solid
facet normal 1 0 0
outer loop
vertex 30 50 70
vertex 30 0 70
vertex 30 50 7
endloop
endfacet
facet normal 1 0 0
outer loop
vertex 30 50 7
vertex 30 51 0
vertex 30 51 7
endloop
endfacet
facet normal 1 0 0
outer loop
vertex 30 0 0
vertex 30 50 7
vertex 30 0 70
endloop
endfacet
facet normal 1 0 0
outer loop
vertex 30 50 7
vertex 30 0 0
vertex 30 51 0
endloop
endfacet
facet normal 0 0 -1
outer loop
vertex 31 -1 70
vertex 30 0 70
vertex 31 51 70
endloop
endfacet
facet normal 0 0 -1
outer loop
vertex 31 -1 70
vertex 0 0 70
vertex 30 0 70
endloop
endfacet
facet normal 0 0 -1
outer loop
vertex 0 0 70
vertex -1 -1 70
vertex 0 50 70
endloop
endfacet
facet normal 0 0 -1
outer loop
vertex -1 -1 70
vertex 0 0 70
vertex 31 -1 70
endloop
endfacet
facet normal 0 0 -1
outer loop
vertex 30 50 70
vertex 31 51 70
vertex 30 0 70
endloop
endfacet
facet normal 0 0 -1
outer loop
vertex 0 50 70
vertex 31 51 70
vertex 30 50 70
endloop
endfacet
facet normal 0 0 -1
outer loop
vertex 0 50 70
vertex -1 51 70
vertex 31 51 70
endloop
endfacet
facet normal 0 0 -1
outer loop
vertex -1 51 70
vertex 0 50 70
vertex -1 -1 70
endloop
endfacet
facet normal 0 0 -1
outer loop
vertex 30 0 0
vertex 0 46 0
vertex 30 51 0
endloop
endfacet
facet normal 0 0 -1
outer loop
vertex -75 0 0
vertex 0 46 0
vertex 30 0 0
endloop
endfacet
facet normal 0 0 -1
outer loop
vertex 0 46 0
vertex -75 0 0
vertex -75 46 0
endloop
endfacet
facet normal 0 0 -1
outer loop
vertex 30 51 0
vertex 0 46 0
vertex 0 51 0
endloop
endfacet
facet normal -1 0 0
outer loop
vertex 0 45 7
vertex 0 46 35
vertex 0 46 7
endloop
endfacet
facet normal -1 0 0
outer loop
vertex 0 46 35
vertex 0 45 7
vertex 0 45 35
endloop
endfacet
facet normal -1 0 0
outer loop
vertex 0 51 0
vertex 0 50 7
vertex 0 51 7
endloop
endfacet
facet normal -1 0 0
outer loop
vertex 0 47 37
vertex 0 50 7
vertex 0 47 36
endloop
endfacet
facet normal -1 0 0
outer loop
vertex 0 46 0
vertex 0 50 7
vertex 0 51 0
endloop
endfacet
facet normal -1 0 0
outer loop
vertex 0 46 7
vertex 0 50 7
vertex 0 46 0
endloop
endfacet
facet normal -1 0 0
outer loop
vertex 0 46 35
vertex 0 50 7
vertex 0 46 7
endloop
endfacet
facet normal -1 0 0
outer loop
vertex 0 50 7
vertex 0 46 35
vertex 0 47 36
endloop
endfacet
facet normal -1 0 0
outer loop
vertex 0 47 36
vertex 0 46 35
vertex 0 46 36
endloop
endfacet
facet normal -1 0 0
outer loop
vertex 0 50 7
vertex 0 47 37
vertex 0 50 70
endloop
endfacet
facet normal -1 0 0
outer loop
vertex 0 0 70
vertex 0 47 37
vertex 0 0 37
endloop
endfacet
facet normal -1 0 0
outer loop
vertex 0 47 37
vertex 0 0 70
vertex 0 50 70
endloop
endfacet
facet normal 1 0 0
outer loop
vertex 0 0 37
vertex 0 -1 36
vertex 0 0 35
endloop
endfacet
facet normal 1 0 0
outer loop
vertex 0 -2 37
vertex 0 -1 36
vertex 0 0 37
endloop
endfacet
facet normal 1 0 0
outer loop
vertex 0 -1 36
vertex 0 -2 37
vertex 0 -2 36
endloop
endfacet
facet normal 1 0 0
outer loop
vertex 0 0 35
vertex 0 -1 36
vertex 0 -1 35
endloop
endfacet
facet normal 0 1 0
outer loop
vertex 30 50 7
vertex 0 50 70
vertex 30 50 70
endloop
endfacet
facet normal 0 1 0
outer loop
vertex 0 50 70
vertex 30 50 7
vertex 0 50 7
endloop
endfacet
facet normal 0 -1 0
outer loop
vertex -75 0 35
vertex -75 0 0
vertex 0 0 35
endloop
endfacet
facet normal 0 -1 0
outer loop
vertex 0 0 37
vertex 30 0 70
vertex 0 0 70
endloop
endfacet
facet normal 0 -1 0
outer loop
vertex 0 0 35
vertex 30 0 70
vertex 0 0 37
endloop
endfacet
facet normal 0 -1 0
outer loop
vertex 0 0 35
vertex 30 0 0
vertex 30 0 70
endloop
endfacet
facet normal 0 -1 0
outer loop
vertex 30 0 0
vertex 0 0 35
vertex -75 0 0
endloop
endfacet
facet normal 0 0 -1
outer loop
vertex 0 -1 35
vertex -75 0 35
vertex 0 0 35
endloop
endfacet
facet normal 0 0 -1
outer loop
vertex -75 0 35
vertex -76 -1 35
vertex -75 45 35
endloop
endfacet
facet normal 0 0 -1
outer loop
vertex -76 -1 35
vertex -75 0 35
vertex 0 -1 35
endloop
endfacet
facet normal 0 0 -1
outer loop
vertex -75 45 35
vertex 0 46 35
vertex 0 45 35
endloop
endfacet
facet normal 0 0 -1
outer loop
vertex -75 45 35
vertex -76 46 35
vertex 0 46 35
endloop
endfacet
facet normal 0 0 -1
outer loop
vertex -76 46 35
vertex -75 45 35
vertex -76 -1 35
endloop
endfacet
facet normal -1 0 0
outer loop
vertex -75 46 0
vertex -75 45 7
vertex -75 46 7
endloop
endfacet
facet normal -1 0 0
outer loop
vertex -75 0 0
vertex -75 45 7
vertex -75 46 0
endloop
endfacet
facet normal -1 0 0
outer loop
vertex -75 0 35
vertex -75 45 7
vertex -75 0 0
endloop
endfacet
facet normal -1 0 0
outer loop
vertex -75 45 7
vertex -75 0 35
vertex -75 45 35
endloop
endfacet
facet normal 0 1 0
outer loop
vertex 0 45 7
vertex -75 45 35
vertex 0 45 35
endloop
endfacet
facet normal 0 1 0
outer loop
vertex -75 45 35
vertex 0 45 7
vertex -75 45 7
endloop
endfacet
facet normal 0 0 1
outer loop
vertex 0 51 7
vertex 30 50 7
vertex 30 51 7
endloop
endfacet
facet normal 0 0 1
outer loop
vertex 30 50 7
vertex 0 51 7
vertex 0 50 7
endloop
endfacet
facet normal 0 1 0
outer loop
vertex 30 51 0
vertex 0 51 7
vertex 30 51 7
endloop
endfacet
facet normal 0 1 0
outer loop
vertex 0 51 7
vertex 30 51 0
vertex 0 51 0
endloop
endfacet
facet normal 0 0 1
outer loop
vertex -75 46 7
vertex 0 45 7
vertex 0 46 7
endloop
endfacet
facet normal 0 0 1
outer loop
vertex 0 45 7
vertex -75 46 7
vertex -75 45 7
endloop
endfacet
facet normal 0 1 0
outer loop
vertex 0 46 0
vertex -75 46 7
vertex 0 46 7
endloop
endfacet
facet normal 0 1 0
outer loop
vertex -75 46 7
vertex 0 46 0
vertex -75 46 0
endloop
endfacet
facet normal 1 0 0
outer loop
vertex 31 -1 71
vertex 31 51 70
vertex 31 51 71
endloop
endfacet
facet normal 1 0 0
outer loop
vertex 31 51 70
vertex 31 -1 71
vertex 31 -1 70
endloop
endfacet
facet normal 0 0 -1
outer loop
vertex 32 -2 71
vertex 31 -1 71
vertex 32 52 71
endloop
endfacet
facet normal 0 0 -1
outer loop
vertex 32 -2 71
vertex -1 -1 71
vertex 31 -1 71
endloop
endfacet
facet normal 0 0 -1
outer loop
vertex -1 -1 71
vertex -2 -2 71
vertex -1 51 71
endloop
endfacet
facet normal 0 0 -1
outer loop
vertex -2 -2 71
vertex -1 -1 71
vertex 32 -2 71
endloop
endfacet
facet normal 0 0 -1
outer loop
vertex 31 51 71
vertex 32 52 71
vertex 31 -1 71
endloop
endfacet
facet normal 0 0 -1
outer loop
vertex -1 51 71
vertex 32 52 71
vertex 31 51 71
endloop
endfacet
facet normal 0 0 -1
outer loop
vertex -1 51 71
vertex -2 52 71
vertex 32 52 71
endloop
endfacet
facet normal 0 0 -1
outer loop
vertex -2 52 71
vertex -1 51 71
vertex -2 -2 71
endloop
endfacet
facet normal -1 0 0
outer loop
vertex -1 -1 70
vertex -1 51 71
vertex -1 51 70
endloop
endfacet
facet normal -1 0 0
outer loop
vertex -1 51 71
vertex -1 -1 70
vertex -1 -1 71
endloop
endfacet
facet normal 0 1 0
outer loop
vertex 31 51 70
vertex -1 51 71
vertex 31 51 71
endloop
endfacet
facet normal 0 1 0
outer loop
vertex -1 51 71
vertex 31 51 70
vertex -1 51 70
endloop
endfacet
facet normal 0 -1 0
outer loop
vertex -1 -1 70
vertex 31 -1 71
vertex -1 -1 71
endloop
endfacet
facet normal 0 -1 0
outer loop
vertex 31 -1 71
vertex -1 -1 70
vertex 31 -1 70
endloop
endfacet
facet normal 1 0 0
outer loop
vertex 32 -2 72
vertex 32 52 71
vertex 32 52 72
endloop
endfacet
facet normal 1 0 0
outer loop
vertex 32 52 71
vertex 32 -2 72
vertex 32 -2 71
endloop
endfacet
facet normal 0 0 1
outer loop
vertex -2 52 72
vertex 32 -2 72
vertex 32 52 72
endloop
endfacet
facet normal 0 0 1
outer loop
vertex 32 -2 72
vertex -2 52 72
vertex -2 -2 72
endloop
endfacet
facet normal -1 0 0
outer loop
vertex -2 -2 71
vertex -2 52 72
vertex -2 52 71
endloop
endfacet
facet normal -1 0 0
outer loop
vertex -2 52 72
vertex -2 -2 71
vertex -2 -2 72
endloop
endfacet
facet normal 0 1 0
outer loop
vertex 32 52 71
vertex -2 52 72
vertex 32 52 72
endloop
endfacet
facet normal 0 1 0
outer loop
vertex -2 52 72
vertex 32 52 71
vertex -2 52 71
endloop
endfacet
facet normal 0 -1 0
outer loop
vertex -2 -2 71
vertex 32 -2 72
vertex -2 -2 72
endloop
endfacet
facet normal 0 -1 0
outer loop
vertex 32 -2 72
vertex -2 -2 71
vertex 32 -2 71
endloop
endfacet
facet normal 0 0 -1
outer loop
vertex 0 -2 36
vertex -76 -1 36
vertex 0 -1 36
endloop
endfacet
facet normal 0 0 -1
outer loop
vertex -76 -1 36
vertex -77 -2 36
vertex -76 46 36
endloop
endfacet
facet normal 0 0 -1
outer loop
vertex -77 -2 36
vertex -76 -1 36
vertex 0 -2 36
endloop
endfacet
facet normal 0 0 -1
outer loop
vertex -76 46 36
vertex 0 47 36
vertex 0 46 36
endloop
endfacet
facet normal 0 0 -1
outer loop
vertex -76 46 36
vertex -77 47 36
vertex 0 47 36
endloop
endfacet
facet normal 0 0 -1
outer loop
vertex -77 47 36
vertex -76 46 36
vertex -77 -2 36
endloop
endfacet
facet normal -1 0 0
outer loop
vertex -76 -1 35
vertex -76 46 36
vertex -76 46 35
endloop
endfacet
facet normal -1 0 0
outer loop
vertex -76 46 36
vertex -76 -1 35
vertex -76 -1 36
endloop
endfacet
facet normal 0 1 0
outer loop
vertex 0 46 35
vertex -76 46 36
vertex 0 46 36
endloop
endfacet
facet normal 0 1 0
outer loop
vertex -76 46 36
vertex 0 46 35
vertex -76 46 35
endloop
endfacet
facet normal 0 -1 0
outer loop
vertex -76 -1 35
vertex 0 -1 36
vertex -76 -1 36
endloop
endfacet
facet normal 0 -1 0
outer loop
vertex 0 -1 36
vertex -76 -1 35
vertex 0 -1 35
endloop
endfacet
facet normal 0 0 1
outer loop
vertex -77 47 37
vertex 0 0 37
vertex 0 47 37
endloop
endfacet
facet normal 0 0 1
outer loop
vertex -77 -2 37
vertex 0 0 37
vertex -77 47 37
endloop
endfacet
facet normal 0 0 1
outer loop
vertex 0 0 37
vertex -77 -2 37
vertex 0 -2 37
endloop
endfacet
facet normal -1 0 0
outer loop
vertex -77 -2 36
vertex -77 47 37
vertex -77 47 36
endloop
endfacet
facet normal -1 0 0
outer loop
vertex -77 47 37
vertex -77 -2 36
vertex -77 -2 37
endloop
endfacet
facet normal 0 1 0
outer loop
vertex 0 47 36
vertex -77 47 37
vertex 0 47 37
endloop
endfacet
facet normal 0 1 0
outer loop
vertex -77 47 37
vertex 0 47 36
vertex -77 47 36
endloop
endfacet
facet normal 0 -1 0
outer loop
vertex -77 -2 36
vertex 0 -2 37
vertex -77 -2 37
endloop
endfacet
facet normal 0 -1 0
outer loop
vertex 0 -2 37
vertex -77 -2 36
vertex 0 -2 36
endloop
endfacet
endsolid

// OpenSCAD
cube([30,50,70]);
translate([-75,0,0]) {
    cube([75,45,35]);
}  

translate([0,50,0]) cube([30,1,7]);
translate([-75,45,0]) cube([75,1,7]);

translate([-1,-1,70]) cube([32,52,1]);
translate([-2,-2,71]) cube([34,54,1]);

translate([-76,-1,35]) cube([76,47,1]);
translate([-77,-2,36]) cube([77,49,1]);

polyhedron(
points=[ [0,47,37],[0,-2,37],[-77,-2,37],
[-77,47,37],[0,22.5,46],[-53,22.5,46] ],
faces=[ [0,1,2,3], [0,1,4], [1,2,5,4],
[2,3,5], [3,0,4,5] ] );
